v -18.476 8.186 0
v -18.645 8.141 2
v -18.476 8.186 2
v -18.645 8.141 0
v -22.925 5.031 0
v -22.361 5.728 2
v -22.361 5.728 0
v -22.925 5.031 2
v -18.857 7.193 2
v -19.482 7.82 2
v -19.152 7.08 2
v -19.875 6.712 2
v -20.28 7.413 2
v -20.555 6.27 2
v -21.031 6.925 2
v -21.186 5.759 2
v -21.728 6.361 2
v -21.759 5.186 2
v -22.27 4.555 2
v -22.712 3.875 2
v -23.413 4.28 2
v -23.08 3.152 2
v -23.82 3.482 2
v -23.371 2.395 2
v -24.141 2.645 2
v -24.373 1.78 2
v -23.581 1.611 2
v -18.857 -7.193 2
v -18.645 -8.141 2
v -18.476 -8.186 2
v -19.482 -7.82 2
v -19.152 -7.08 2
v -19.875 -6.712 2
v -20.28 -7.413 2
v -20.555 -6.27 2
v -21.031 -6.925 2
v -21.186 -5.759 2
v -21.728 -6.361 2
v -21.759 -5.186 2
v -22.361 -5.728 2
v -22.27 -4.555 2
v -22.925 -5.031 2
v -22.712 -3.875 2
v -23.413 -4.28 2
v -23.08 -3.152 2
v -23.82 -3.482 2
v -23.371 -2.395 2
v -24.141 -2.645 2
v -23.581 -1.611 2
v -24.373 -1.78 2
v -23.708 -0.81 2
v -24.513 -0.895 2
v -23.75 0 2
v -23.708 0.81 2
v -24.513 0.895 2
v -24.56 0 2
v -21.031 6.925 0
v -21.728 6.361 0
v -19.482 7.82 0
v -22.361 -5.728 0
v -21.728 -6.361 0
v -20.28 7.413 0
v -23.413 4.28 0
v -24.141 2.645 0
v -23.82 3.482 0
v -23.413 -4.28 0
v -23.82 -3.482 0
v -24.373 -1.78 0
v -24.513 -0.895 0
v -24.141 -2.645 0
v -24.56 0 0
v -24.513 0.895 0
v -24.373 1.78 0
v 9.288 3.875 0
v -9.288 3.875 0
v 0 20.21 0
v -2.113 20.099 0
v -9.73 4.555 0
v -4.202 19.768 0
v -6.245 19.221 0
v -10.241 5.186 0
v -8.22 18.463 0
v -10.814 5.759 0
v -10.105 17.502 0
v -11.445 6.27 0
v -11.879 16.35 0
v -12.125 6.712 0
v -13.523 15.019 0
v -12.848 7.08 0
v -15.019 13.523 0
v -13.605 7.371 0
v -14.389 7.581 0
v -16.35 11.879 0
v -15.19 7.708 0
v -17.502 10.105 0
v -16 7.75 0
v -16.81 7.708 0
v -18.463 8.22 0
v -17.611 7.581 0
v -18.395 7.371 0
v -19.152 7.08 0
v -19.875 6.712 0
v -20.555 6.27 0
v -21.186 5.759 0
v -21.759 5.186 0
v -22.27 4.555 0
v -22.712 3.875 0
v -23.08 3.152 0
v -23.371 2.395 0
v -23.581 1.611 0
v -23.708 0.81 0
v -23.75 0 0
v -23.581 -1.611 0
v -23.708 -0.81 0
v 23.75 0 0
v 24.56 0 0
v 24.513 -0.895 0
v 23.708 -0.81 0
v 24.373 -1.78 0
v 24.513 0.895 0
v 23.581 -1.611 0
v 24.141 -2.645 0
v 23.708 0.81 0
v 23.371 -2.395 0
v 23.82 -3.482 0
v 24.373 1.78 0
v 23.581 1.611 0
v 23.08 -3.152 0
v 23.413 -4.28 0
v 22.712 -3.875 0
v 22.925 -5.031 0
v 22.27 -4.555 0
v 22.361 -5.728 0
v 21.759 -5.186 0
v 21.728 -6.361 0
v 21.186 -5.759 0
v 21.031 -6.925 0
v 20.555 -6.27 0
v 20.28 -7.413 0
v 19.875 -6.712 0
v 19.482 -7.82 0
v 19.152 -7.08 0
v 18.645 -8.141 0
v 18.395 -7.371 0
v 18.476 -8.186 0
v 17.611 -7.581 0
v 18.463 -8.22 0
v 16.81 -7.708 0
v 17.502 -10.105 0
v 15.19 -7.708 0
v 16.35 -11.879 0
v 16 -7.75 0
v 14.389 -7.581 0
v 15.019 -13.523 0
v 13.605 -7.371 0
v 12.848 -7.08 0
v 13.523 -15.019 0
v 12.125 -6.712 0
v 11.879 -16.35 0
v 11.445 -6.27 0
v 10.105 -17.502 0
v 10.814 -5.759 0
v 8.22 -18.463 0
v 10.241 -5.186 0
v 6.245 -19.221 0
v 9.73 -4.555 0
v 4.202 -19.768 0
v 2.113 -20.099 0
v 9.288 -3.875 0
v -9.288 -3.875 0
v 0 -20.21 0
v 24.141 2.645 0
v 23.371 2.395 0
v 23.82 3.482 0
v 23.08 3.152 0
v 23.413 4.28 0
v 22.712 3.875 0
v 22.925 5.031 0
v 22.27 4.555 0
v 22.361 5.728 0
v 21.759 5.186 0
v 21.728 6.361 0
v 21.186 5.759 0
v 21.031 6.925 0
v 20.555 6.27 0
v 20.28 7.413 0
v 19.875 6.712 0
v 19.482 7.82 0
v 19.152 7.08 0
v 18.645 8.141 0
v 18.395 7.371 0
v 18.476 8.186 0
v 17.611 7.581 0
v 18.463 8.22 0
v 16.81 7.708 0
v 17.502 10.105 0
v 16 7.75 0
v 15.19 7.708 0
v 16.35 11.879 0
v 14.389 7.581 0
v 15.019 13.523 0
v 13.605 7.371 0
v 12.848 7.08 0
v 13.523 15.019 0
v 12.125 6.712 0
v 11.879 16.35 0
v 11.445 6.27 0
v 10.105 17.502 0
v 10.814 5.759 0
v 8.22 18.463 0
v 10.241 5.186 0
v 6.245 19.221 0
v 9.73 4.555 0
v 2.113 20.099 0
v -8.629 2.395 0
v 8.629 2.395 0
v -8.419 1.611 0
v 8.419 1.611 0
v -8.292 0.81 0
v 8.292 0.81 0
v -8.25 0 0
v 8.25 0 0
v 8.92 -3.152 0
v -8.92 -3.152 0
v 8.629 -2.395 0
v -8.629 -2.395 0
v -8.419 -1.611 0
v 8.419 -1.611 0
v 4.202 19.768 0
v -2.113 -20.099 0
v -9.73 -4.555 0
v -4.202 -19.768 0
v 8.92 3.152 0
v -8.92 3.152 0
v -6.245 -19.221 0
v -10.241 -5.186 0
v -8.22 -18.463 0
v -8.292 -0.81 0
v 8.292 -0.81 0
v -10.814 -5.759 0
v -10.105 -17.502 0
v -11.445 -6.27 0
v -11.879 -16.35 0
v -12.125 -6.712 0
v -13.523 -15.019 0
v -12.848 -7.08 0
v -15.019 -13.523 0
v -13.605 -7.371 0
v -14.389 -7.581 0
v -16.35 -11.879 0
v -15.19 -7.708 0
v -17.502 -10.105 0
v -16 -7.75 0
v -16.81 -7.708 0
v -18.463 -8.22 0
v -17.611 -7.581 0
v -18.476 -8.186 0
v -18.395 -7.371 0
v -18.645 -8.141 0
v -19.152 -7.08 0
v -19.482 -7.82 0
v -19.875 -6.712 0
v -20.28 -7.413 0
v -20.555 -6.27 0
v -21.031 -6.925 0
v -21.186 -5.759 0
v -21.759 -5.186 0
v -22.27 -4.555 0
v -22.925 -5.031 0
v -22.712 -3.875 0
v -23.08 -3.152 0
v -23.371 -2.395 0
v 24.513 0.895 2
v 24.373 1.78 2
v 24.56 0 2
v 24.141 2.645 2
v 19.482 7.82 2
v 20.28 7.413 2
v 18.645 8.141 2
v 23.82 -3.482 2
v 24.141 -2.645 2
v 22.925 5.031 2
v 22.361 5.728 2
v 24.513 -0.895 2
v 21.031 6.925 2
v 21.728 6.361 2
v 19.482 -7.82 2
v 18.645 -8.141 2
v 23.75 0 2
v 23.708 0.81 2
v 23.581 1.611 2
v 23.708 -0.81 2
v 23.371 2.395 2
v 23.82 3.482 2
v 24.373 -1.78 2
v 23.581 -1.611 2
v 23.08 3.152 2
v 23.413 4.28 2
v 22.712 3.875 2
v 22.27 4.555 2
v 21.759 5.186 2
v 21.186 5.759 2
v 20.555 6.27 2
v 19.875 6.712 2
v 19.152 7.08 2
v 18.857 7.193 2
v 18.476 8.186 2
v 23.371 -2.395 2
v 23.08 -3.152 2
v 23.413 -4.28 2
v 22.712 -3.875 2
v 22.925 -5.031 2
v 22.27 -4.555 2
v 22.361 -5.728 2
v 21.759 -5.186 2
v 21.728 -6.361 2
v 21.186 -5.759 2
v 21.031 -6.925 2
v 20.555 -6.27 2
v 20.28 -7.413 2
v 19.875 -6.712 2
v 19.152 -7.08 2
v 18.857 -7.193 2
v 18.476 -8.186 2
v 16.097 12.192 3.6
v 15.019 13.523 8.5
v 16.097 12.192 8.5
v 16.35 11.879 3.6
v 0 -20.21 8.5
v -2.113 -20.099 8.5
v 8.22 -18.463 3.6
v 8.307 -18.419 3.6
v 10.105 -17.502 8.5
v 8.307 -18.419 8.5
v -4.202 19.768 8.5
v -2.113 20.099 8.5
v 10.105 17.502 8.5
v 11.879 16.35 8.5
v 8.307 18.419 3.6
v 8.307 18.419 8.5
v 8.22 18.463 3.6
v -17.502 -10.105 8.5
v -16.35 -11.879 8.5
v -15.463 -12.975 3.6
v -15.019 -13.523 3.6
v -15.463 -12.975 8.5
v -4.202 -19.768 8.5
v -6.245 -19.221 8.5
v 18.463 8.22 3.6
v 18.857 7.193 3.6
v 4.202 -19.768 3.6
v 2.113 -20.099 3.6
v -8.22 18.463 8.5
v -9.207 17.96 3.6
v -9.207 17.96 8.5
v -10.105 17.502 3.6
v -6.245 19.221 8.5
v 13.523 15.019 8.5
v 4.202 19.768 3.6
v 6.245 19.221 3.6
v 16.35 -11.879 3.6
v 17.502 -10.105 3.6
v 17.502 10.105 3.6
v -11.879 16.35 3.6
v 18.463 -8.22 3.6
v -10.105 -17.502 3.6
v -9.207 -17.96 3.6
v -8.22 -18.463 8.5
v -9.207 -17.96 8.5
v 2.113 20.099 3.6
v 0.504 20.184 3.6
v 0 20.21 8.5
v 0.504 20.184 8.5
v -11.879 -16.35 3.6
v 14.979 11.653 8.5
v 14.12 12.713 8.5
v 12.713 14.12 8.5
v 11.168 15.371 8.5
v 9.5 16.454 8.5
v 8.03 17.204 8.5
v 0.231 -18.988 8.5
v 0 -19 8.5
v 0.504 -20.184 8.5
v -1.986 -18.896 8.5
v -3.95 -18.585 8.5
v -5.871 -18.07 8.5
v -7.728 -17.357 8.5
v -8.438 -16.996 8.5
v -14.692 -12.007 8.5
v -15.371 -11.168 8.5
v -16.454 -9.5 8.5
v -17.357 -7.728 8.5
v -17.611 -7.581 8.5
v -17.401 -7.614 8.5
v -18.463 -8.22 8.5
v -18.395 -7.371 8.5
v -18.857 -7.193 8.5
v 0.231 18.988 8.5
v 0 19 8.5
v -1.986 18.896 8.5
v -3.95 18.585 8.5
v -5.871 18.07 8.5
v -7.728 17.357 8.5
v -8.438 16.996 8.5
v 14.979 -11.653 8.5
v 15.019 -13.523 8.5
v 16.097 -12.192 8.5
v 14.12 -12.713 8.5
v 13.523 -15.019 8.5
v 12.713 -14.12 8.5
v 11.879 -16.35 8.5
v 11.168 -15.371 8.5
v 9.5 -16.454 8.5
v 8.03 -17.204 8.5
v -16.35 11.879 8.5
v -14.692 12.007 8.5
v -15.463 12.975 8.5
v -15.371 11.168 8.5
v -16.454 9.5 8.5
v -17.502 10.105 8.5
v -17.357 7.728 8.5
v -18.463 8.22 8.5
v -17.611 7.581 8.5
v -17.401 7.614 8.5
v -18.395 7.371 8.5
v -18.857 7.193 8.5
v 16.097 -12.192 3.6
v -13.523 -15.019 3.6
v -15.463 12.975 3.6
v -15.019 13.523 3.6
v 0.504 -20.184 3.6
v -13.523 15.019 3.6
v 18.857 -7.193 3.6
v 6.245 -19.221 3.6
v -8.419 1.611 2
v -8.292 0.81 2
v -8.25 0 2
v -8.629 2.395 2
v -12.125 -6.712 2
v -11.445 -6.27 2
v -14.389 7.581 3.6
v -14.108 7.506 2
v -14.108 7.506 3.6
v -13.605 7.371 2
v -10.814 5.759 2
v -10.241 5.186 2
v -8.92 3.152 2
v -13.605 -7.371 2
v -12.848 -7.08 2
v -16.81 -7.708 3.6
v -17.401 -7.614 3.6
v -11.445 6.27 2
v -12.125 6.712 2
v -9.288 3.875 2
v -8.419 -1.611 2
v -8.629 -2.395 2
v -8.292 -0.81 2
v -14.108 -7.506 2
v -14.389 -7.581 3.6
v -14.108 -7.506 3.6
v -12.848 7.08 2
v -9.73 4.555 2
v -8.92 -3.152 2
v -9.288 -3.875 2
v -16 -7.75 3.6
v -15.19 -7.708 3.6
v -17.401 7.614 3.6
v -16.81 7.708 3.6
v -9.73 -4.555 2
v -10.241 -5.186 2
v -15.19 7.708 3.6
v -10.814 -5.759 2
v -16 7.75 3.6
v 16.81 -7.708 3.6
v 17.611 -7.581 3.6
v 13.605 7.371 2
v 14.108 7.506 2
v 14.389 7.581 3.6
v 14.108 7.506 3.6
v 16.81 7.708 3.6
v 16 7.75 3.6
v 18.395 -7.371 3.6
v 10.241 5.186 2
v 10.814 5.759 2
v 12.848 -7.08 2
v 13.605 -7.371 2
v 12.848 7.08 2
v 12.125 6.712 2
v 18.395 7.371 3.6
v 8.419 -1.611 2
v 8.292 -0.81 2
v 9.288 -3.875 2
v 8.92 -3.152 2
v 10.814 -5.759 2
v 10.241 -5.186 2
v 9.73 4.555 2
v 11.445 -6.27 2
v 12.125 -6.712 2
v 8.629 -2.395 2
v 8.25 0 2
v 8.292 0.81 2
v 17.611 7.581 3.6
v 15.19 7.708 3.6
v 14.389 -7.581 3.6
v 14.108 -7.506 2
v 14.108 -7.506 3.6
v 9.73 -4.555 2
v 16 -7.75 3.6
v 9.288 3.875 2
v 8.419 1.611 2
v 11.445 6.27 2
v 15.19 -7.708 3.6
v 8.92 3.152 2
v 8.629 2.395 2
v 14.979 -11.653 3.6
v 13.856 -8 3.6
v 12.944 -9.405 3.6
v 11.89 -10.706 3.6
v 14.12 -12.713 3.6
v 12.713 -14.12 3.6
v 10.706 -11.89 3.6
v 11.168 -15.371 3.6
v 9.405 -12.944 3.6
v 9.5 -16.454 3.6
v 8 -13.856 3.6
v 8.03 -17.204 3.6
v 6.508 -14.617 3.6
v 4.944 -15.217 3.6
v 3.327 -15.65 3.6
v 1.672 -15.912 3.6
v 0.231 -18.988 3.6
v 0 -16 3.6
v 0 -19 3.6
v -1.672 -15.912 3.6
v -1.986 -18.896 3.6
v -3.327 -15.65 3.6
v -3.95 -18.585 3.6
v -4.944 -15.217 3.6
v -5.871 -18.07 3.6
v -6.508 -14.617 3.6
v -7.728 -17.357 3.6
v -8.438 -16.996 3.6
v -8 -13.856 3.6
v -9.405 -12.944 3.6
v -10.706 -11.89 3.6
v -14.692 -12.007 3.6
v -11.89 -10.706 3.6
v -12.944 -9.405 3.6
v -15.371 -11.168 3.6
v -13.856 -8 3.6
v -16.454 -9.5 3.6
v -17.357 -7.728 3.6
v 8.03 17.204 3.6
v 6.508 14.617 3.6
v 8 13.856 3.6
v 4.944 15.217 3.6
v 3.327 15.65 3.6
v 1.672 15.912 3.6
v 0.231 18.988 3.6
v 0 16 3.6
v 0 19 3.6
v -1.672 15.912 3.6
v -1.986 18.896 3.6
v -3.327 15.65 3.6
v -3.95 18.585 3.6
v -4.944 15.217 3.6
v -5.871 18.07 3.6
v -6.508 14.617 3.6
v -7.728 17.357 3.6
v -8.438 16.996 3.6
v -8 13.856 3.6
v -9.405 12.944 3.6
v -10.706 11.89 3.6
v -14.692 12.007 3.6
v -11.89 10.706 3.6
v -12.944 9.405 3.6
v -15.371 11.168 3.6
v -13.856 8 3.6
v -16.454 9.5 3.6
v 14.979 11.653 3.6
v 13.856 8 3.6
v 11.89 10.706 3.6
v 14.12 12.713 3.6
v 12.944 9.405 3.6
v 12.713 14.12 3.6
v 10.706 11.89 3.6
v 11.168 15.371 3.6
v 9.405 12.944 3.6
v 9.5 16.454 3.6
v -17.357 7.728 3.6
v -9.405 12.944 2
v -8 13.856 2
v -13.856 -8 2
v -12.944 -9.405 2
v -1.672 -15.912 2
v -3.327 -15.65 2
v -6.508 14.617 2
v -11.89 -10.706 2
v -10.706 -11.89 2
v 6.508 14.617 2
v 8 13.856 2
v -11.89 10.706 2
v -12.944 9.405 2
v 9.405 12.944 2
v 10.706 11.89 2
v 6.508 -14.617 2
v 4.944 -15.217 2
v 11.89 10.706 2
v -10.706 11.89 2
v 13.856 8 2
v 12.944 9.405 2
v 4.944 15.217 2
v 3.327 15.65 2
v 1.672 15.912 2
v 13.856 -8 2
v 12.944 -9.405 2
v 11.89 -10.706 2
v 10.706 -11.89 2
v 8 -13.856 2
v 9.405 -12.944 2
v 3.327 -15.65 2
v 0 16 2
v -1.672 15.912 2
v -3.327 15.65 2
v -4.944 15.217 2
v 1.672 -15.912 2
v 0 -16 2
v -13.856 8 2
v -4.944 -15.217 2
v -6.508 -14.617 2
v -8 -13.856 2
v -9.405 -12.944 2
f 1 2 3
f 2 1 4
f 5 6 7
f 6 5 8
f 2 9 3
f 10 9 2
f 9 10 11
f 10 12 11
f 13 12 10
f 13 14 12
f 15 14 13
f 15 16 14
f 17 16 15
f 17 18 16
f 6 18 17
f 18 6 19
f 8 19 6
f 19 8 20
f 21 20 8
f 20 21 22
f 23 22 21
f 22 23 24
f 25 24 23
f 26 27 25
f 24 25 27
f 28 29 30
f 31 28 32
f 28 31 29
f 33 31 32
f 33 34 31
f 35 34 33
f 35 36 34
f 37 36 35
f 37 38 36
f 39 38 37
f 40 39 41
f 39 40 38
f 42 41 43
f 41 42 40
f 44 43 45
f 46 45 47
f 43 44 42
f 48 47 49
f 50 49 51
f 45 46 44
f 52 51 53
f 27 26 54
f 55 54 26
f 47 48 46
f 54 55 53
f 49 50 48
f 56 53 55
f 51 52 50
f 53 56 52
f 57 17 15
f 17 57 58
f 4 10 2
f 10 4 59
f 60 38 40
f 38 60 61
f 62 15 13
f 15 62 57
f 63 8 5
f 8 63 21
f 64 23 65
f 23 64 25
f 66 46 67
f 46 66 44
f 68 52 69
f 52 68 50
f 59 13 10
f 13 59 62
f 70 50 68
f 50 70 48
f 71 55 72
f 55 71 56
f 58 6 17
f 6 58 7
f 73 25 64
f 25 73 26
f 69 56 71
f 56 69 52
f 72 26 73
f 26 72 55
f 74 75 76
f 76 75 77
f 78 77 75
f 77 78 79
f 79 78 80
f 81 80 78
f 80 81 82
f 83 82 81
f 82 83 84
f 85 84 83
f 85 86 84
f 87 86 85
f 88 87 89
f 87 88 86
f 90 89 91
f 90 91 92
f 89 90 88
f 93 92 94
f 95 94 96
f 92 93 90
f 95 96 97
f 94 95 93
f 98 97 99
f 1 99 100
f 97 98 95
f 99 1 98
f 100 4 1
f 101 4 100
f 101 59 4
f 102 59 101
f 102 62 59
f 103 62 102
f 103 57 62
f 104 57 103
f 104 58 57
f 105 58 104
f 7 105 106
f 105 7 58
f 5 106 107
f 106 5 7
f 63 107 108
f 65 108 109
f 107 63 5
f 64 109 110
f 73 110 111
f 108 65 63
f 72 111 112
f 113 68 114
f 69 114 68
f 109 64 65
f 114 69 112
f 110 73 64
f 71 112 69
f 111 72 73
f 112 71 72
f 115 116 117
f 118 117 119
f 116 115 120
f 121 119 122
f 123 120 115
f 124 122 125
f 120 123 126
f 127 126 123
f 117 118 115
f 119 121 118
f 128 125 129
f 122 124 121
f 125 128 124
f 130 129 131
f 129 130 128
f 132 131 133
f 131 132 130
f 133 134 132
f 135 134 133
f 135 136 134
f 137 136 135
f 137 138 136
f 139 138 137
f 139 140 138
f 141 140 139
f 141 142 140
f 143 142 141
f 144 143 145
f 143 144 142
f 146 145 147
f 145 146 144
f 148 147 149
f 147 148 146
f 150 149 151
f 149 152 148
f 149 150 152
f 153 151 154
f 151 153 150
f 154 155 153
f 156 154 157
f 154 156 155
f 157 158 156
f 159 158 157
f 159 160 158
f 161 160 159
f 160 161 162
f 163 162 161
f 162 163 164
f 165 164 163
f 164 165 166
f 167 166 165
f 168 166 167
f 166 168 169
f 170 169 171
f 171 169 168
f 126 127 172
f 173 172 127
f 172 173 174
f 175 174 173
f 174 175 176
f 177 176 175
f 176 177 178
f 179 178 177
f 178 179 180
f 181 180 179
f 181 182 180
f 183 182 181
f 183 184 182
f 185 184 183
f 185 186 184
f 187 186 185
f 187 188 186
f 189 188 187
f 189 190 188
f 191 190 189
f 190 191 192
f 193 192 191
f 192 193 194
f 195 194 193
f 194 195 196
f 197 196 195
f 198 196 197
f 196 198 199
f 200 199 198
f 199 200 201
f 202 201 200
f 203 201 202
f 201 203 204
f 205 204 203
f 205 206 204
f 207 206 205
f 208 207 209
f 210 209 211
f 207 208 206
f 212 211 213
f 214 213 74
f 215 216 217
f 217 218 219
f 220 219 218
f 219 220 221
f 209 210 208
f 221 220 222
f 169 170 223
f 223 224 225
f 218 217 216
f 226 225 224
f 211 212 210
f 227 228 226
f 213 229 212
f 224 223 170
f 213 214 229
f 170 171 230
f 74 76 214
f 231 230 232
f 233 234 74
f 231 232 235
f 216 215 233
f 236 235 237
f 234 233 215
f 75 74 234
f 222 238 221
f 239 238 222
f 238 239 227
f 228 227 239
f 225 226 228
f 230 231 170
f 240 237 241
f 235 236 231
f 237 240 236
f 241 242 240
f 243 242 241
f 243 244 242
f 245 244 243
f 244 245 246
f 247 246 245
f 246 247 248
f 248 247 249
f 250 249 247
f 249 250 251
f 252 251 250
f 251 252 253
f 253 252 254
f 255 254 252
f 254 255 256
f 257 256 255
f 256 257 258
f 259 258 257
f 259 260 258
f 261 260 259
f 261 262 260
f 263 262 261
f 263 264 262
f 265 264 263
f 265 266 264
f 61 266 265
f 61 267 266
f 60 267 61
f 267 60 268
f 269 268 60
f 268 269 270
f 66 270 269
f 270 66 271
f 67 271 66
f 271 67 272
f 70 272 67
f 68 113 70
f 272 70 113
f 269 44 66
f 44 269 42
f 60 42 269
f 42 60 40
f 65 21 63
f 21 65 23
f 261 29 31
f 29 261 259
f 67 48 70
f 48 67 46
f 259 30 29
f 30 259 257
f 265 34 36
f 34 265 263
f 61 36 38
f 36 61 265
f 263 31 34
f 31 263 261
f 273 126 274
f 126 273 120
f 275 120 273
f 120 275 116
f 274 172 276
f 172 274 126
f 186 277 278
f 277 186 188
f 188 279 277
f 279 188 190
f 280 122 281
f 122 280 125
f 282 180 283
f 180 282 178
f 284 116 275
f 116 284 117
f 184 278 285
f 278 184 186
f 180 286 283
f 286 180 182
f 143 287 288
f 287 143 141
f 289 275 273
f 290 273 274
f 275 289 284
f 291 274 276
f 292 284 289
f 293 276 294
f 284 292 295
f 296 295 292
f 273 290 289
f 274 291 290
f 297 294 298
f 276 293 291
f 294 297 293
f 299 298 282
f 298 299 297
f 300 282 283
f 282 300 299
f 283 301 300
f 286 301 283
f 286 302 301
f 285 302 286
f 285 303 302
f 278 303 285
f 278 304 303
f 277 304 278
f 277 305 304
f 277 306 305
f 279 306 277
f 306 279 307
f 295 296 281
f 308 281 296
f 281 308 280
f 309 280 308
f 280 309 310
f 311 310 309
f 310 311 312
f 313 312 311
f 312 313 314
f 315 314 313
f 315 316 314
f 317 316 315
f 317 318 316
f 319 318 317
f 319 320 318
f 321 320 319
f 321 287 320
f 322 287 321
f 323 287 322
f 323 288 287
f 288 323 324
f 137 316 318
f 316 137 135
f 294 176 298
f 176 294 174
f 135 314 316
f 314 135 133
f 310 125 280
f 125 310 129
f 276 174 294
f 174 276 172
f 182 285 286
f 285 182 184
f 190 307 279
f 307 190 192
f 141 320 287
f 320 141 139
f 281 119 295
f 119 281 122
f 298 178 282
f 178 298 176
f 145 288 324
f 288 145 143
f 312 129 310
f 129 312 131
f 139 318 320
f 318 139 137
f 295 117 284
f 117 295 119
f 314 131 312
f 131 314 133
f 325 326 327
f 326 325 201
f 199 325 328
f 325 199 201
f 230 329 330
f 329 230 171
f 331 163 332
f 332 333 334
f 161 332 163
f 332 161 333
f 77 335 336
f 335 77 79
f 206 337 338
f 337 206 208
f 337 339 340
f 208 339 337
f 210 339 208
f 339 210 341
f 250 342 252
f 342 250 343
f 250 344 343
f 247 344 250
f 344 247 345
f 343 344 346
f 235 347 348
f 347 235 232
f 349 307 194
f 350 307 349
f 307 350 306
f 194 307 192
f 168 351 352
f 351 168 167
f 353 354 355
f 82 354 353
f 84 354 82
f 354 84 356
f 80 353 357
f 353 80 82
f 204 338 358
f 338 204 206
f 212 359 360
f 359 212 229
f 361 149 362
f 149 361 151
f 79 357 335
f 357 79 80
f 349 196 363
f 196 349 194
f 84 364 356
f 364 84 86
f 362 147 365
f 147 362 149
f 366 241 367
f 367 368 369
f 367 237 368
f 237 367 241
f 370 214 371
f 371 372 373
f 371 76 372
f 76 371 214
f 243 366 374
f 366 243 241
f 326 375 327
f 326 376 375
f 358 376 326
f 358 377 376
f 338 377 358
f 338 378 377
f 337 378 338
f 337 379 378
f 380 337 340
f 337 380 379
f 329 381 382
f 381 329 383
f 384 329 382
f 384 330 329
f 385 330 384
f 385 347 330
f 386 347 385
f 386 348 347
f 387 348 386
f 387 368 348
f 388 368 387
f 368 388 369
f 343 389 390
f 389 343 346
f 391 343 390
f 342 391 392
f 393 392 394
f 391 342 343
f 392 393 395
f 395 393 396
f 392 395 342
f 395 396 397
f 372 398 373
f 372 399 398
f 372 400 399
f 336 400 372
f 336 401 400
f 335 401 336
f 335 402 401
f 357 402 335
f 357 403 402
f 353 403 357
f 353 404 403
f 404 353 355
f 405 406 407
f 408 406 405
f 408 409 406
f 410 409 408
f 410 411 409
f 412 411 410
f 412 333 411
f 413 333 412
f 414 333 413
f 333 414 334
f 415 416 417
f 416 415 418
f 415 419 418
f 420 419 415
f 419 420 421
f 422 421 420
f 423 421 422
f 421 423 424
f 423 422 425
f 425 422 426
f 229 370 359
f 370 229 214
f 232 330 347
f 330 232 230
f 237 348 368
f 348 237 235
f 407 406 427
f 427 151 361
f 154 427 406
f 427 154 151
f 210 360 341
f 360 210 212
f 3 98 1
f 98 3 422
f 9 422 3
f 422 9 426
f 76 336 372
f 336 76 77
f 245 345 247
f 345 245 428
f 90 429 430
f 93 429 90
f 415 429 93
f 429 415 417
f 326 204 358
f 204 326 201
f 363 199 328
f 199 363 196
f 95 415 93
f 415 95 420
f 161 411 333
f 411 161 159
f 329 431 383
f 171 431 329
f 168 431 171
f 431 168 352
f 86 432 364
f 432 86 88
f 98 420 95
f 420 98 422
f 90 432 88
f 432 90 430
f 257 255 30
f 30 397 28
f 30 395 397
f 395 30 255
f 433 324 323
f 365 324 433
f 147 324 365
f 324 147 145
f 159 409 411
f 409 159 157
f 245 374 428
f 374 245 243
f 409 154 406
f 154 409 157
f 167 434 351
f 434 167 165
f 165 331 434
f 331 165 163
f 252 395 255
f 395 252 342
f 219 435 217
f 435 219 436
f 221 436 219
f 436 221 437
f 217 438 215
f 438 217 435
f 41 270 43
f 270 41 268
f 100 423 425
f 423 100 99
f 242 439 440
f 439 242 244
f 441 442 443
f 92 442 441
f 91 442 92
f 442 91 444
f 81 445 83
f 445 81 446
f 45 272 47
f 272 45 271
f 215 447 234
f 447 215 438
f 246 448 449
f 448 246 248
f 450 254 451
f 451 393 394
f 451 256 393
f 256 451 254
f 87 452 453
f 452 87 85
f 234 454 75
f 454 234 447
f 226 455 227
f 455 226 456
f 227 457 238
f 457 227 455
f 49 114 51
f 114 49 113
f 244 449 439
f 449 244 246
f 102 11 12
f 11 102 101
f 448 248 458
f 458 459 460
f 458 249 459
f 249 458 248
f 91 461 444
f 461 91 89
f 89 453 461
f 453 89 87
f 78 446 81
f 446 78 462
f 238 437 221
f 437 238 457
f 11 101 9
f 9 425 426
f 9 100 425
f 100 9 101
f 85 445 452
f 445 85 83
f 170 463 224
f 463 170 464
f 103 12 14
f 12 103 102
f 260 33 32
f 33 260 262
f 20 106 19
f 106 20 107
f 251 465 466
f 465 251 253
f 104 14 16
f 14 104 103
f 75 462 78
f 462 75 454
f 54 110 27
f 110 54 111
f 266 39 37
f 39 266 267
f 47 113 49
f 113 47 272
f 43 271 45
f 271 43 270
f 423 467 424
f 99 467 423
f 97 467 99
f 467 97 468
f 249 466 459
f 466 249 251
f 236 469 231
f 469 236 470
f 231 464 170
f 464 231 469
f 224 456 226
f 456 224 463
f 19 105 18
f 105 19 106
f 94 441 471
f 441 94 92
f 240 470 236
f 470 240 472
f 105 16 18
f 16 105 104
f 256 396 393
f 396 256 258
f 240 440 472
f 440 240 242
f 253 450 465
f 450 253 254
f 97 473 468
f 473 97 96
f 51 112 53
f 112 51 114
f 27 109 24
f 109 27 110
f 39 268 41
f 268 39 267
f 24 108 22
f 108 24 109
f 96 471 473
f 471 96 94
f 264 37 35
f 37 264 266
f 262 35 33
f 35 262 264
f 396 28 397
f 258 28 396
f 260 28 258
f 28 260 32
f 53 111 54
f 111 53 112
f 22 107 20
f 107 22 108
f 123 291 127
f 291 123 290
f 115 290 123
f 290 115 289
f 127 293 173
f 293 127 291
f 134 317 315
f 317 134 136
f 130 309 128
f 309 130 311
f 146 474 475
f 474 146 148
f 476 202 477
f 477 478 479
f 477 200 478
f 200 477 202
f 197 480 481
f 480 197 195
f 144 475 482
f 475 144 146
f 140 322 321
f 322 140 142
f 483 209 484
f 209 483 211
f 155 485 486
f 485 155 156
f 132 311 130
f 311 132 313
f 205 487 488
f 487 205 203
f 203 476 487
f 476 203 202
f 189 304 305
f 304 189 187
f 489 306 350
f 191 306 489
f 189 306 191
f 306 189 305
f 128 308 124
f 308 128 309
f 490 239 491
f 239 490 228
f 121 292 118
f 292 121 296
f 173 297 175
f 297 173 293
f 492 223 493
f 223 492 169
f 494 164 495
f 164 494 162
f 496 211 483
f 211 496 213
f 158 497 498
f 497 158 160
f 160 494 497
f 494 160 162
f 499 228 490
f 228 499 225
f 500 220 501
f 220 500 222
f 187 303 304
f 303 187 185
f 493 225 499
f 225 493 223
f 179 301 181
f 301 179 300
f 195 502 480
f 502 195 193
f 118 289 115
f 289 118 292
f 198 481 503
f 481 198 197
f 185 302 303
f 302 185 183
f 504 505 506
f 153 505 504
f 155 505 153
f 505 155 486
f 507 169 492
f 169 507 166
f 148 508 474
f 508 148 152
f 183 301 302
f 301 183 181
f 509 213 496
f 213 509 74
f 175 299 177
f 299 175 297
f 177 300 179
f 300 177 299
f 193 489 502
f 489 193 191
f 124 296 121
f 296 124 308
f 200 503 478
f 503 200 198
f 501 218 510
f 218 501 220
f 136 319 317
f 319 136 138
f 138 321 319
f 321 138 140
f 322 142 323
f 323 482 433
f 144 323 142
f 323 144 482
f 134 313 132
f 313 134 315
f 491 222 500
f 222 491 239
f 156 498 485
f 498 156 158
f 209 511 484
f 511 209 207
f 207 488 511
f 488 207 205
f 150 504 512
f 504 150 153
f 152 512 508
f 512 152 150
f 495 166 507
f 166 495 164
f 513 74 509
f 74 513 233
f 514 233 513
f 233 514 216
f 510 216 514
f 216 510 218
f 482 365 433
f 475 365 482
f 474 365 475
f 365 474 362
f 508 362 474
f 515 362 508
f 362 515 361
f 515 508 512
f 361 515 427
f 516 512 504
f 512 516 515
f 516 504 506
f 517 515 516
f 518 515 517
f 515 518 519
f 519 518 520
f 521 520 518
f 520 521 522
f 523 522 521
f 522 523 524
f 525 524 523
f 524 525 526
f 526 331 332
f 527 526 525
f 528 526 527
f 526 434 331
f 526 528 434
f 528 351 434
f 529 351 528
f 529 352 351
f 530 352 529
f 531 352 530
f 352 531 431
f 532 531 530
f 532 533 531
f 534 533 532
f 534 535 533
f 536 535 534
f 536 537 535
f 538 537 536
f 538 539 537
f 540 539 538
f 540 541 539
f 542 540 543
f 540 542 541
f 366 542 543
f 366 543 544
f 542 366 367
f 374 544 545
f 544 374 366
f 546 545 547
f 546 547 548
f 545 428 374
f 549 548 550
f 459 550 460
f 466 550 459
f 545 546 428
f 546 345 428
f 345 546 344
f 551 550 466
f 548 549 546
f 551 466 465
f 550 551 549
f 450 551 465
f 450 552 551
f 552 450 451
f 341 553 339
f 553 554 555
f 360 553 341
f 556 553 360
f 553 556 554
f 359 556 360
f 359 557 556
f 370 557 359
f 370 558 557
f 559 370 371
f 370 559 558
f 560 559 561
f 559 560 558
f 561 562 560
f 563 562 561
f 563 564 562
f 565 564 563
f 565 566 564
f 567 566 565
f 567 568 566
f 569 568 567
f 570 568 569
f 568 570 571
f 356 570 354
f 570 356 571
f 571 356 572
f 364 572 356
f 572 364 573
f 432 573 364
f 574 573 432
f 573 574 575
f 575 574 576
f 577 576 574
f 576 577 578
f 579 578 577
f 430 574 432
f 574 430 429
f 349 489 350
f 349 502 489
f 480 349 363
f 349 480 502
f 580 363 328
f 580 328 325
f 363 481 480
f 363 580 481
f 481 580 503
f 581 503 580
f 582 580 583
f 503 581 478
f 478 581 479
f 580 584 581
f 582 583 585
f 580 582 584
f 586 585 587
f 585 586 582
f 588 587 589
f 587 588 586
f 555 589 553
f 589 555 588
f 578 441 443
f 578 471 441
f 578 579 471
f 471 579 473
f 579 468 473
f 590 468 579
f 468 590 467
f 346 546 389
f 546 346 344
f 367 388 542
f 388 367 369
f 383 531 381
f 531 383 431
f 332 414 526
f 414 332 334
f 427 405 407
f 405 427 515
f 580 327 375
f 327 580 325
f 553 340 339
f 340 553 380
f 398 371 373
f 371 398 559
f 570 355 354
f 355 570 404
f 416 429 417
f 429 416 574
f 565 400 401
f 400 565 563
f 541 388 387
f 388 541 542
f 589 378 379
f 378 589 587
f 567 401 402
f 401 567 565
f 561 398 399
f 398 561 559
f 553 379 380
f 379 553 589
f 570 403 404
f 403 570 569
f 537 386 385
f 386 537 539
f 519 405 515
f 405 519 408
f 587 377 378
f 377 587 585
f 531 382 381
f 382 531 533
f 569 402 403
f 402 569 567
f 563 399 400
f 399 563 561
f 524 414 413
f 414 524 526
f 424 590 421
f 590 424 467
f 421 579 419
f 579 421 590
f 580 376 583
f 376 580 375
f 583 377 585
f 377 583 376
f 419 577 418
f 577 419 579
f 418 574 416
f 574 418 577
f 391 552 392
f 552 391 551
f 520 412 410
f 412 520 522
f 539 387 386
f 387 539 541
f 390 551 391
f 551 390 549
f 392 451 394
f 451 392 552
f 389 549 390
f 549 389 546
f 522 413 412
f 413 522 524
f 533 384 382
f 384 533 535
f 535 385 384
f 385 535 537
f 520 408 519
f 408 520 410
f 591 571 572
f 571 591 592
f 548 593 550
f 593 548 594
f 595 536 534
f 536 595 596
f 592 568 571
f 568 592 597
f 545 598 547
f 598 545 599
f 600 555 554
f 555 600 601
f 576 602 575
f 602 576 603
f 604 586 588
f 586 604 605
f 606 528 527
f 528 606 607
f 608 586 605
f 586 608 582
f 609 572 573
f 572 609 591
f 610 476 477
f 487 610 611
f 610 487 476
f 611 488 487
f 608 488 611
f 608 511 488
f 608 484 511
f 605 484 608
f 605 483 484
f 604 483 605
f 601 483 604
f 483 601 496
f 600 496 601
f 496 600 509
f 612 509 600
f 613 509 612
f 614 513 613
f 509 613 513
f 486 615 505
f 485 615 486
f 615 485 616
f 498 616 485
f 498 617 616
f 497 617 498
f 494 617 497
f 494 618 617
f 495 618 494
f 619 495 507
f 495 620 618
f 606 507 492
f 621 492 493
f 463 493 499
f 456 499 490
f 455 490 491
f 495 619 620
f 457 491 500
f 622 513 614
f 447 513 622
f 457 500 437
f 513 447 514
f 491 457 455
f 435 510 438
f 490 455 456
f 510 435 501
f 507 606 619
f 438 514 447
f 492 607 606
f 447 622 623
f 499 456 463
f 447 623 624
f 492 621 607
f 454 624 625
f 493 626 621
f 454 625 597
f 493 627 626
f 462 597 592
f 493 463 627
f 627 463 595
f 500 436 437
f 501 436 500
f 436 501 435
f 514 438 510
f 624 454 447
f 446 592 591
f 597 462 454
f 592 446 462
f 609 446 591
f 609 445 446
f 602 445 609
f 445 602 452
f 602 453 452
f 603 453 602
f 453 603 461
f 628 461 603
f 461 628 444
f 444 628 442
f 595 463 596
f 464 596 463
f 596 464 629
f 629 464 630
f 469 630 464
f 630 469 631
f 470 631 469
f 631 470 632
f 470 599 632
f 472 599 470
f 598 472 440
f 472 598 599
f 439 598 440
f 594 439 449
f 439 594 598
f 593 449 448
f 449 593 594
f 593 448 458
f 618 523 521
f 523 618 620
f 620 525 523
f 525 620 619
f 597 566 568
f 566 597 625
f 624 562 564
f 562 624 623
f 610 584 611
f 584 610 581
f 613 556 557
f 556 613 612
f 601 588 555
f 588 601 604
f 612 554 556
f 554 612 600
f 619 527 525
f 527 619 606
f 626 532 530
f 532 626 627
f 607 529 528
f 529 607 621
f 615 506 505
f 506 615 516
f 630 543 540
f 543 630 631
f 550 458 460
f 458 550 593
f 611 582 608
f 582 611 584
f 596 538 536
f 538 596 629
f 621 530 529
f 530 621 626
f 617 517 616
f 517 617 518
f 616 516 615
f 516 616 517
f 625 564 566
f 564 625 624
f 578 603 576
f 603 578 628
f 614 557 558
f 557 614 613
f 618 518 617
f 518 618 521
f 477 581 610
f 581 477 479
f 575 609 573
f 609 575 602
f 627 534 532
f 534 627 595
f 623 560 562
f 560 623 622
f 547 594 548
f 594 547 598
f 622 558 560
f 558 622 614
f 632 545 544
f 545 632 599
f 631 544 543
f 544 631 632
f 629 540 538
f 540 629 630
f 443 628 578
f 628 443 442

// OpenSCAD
// Mount to put spinning magnets onto a PC fan for magnetic stirrer

/* [Magnets] */

// Allow clearance
Magnet_Diameter = 15.5;
// Allow clearance
Magnet_Height = 2;  

// Wall thickness of magnet retainer
Magnet_Wall = 0.81;
//This is two walls with line width of 0.4mm and extra 0.01 is to prevent rounding errors.

/* [Washer] */

Washer_Diameter = 32; //  Generous is OK.
Washer_Height = 1.6; 

/* [Fan] */

// Inner diameter of part that engages with fan
Fan_Diameter = 38; 
// Height of part that engages with fan
Fan_Height = 8.5; 
// Wall thickness of part that engages with fan
Fan_Wall = 1.21; 
// Number of fan blades
Fan_Blades = 7; 
// Width of slot for each blade.
Fan_Slot = 8; 
// Tune to avoid short segments when changing number of blades!
Fan_Fiddle_Factor = 0.75; 	// The 0.75 is a fiddle factor to avoid short segments. If you change number of blades, you may need to fiddle with this.

/* [Hidden] */

$fn = 60;
Tad = 0.1;
Tad2 = Tad*2;

difference () {
	union () {
		// Main body
		cylinder (d=Fan_Diameter+Fan_Wall*2, h=Fan_Height);
		// Mag bodies
		for (x=[-1,1]) translate ([Washer_Diameter/2*x, 0, 0]) cylinder (d=Magnet_Diameter+Magnet_Wall*2, h=Magnet_Height);
	}
	// Remove cylinder for fan
	translate ([0, 0, Magnet_Height+Washer_Height]) cylinder (d=Fan_Diameter, h=Fan_Height);
	// Remove cylinder for washer
	translate ([0, 0, Magnet_Height]) cylinder (d=Washer_Diameter, h=Washer_Height+Tad);
	// Remove mag holes
	for (x=[-1,1]) translate ([Washer_Diameter/2*x, 0, -Tad]) cylinder (d=Magnet_Diameter, h=Fan_Height*2); // Fan_Height*2 just means "go mad, go high".
	// Blade cutouts.

	for (b = [1 : Fan_Blades]) rotate ([0, 0, (b + Fan_Fiddle_Factor) * (360 / Fan_Blades)]) translate ([- Fan_Slot/2, 0, Magnet_Height + Washer_Height]) cube ([Fan_Slot, Fan_Diameter*2, Fan_Height*2]);
}
